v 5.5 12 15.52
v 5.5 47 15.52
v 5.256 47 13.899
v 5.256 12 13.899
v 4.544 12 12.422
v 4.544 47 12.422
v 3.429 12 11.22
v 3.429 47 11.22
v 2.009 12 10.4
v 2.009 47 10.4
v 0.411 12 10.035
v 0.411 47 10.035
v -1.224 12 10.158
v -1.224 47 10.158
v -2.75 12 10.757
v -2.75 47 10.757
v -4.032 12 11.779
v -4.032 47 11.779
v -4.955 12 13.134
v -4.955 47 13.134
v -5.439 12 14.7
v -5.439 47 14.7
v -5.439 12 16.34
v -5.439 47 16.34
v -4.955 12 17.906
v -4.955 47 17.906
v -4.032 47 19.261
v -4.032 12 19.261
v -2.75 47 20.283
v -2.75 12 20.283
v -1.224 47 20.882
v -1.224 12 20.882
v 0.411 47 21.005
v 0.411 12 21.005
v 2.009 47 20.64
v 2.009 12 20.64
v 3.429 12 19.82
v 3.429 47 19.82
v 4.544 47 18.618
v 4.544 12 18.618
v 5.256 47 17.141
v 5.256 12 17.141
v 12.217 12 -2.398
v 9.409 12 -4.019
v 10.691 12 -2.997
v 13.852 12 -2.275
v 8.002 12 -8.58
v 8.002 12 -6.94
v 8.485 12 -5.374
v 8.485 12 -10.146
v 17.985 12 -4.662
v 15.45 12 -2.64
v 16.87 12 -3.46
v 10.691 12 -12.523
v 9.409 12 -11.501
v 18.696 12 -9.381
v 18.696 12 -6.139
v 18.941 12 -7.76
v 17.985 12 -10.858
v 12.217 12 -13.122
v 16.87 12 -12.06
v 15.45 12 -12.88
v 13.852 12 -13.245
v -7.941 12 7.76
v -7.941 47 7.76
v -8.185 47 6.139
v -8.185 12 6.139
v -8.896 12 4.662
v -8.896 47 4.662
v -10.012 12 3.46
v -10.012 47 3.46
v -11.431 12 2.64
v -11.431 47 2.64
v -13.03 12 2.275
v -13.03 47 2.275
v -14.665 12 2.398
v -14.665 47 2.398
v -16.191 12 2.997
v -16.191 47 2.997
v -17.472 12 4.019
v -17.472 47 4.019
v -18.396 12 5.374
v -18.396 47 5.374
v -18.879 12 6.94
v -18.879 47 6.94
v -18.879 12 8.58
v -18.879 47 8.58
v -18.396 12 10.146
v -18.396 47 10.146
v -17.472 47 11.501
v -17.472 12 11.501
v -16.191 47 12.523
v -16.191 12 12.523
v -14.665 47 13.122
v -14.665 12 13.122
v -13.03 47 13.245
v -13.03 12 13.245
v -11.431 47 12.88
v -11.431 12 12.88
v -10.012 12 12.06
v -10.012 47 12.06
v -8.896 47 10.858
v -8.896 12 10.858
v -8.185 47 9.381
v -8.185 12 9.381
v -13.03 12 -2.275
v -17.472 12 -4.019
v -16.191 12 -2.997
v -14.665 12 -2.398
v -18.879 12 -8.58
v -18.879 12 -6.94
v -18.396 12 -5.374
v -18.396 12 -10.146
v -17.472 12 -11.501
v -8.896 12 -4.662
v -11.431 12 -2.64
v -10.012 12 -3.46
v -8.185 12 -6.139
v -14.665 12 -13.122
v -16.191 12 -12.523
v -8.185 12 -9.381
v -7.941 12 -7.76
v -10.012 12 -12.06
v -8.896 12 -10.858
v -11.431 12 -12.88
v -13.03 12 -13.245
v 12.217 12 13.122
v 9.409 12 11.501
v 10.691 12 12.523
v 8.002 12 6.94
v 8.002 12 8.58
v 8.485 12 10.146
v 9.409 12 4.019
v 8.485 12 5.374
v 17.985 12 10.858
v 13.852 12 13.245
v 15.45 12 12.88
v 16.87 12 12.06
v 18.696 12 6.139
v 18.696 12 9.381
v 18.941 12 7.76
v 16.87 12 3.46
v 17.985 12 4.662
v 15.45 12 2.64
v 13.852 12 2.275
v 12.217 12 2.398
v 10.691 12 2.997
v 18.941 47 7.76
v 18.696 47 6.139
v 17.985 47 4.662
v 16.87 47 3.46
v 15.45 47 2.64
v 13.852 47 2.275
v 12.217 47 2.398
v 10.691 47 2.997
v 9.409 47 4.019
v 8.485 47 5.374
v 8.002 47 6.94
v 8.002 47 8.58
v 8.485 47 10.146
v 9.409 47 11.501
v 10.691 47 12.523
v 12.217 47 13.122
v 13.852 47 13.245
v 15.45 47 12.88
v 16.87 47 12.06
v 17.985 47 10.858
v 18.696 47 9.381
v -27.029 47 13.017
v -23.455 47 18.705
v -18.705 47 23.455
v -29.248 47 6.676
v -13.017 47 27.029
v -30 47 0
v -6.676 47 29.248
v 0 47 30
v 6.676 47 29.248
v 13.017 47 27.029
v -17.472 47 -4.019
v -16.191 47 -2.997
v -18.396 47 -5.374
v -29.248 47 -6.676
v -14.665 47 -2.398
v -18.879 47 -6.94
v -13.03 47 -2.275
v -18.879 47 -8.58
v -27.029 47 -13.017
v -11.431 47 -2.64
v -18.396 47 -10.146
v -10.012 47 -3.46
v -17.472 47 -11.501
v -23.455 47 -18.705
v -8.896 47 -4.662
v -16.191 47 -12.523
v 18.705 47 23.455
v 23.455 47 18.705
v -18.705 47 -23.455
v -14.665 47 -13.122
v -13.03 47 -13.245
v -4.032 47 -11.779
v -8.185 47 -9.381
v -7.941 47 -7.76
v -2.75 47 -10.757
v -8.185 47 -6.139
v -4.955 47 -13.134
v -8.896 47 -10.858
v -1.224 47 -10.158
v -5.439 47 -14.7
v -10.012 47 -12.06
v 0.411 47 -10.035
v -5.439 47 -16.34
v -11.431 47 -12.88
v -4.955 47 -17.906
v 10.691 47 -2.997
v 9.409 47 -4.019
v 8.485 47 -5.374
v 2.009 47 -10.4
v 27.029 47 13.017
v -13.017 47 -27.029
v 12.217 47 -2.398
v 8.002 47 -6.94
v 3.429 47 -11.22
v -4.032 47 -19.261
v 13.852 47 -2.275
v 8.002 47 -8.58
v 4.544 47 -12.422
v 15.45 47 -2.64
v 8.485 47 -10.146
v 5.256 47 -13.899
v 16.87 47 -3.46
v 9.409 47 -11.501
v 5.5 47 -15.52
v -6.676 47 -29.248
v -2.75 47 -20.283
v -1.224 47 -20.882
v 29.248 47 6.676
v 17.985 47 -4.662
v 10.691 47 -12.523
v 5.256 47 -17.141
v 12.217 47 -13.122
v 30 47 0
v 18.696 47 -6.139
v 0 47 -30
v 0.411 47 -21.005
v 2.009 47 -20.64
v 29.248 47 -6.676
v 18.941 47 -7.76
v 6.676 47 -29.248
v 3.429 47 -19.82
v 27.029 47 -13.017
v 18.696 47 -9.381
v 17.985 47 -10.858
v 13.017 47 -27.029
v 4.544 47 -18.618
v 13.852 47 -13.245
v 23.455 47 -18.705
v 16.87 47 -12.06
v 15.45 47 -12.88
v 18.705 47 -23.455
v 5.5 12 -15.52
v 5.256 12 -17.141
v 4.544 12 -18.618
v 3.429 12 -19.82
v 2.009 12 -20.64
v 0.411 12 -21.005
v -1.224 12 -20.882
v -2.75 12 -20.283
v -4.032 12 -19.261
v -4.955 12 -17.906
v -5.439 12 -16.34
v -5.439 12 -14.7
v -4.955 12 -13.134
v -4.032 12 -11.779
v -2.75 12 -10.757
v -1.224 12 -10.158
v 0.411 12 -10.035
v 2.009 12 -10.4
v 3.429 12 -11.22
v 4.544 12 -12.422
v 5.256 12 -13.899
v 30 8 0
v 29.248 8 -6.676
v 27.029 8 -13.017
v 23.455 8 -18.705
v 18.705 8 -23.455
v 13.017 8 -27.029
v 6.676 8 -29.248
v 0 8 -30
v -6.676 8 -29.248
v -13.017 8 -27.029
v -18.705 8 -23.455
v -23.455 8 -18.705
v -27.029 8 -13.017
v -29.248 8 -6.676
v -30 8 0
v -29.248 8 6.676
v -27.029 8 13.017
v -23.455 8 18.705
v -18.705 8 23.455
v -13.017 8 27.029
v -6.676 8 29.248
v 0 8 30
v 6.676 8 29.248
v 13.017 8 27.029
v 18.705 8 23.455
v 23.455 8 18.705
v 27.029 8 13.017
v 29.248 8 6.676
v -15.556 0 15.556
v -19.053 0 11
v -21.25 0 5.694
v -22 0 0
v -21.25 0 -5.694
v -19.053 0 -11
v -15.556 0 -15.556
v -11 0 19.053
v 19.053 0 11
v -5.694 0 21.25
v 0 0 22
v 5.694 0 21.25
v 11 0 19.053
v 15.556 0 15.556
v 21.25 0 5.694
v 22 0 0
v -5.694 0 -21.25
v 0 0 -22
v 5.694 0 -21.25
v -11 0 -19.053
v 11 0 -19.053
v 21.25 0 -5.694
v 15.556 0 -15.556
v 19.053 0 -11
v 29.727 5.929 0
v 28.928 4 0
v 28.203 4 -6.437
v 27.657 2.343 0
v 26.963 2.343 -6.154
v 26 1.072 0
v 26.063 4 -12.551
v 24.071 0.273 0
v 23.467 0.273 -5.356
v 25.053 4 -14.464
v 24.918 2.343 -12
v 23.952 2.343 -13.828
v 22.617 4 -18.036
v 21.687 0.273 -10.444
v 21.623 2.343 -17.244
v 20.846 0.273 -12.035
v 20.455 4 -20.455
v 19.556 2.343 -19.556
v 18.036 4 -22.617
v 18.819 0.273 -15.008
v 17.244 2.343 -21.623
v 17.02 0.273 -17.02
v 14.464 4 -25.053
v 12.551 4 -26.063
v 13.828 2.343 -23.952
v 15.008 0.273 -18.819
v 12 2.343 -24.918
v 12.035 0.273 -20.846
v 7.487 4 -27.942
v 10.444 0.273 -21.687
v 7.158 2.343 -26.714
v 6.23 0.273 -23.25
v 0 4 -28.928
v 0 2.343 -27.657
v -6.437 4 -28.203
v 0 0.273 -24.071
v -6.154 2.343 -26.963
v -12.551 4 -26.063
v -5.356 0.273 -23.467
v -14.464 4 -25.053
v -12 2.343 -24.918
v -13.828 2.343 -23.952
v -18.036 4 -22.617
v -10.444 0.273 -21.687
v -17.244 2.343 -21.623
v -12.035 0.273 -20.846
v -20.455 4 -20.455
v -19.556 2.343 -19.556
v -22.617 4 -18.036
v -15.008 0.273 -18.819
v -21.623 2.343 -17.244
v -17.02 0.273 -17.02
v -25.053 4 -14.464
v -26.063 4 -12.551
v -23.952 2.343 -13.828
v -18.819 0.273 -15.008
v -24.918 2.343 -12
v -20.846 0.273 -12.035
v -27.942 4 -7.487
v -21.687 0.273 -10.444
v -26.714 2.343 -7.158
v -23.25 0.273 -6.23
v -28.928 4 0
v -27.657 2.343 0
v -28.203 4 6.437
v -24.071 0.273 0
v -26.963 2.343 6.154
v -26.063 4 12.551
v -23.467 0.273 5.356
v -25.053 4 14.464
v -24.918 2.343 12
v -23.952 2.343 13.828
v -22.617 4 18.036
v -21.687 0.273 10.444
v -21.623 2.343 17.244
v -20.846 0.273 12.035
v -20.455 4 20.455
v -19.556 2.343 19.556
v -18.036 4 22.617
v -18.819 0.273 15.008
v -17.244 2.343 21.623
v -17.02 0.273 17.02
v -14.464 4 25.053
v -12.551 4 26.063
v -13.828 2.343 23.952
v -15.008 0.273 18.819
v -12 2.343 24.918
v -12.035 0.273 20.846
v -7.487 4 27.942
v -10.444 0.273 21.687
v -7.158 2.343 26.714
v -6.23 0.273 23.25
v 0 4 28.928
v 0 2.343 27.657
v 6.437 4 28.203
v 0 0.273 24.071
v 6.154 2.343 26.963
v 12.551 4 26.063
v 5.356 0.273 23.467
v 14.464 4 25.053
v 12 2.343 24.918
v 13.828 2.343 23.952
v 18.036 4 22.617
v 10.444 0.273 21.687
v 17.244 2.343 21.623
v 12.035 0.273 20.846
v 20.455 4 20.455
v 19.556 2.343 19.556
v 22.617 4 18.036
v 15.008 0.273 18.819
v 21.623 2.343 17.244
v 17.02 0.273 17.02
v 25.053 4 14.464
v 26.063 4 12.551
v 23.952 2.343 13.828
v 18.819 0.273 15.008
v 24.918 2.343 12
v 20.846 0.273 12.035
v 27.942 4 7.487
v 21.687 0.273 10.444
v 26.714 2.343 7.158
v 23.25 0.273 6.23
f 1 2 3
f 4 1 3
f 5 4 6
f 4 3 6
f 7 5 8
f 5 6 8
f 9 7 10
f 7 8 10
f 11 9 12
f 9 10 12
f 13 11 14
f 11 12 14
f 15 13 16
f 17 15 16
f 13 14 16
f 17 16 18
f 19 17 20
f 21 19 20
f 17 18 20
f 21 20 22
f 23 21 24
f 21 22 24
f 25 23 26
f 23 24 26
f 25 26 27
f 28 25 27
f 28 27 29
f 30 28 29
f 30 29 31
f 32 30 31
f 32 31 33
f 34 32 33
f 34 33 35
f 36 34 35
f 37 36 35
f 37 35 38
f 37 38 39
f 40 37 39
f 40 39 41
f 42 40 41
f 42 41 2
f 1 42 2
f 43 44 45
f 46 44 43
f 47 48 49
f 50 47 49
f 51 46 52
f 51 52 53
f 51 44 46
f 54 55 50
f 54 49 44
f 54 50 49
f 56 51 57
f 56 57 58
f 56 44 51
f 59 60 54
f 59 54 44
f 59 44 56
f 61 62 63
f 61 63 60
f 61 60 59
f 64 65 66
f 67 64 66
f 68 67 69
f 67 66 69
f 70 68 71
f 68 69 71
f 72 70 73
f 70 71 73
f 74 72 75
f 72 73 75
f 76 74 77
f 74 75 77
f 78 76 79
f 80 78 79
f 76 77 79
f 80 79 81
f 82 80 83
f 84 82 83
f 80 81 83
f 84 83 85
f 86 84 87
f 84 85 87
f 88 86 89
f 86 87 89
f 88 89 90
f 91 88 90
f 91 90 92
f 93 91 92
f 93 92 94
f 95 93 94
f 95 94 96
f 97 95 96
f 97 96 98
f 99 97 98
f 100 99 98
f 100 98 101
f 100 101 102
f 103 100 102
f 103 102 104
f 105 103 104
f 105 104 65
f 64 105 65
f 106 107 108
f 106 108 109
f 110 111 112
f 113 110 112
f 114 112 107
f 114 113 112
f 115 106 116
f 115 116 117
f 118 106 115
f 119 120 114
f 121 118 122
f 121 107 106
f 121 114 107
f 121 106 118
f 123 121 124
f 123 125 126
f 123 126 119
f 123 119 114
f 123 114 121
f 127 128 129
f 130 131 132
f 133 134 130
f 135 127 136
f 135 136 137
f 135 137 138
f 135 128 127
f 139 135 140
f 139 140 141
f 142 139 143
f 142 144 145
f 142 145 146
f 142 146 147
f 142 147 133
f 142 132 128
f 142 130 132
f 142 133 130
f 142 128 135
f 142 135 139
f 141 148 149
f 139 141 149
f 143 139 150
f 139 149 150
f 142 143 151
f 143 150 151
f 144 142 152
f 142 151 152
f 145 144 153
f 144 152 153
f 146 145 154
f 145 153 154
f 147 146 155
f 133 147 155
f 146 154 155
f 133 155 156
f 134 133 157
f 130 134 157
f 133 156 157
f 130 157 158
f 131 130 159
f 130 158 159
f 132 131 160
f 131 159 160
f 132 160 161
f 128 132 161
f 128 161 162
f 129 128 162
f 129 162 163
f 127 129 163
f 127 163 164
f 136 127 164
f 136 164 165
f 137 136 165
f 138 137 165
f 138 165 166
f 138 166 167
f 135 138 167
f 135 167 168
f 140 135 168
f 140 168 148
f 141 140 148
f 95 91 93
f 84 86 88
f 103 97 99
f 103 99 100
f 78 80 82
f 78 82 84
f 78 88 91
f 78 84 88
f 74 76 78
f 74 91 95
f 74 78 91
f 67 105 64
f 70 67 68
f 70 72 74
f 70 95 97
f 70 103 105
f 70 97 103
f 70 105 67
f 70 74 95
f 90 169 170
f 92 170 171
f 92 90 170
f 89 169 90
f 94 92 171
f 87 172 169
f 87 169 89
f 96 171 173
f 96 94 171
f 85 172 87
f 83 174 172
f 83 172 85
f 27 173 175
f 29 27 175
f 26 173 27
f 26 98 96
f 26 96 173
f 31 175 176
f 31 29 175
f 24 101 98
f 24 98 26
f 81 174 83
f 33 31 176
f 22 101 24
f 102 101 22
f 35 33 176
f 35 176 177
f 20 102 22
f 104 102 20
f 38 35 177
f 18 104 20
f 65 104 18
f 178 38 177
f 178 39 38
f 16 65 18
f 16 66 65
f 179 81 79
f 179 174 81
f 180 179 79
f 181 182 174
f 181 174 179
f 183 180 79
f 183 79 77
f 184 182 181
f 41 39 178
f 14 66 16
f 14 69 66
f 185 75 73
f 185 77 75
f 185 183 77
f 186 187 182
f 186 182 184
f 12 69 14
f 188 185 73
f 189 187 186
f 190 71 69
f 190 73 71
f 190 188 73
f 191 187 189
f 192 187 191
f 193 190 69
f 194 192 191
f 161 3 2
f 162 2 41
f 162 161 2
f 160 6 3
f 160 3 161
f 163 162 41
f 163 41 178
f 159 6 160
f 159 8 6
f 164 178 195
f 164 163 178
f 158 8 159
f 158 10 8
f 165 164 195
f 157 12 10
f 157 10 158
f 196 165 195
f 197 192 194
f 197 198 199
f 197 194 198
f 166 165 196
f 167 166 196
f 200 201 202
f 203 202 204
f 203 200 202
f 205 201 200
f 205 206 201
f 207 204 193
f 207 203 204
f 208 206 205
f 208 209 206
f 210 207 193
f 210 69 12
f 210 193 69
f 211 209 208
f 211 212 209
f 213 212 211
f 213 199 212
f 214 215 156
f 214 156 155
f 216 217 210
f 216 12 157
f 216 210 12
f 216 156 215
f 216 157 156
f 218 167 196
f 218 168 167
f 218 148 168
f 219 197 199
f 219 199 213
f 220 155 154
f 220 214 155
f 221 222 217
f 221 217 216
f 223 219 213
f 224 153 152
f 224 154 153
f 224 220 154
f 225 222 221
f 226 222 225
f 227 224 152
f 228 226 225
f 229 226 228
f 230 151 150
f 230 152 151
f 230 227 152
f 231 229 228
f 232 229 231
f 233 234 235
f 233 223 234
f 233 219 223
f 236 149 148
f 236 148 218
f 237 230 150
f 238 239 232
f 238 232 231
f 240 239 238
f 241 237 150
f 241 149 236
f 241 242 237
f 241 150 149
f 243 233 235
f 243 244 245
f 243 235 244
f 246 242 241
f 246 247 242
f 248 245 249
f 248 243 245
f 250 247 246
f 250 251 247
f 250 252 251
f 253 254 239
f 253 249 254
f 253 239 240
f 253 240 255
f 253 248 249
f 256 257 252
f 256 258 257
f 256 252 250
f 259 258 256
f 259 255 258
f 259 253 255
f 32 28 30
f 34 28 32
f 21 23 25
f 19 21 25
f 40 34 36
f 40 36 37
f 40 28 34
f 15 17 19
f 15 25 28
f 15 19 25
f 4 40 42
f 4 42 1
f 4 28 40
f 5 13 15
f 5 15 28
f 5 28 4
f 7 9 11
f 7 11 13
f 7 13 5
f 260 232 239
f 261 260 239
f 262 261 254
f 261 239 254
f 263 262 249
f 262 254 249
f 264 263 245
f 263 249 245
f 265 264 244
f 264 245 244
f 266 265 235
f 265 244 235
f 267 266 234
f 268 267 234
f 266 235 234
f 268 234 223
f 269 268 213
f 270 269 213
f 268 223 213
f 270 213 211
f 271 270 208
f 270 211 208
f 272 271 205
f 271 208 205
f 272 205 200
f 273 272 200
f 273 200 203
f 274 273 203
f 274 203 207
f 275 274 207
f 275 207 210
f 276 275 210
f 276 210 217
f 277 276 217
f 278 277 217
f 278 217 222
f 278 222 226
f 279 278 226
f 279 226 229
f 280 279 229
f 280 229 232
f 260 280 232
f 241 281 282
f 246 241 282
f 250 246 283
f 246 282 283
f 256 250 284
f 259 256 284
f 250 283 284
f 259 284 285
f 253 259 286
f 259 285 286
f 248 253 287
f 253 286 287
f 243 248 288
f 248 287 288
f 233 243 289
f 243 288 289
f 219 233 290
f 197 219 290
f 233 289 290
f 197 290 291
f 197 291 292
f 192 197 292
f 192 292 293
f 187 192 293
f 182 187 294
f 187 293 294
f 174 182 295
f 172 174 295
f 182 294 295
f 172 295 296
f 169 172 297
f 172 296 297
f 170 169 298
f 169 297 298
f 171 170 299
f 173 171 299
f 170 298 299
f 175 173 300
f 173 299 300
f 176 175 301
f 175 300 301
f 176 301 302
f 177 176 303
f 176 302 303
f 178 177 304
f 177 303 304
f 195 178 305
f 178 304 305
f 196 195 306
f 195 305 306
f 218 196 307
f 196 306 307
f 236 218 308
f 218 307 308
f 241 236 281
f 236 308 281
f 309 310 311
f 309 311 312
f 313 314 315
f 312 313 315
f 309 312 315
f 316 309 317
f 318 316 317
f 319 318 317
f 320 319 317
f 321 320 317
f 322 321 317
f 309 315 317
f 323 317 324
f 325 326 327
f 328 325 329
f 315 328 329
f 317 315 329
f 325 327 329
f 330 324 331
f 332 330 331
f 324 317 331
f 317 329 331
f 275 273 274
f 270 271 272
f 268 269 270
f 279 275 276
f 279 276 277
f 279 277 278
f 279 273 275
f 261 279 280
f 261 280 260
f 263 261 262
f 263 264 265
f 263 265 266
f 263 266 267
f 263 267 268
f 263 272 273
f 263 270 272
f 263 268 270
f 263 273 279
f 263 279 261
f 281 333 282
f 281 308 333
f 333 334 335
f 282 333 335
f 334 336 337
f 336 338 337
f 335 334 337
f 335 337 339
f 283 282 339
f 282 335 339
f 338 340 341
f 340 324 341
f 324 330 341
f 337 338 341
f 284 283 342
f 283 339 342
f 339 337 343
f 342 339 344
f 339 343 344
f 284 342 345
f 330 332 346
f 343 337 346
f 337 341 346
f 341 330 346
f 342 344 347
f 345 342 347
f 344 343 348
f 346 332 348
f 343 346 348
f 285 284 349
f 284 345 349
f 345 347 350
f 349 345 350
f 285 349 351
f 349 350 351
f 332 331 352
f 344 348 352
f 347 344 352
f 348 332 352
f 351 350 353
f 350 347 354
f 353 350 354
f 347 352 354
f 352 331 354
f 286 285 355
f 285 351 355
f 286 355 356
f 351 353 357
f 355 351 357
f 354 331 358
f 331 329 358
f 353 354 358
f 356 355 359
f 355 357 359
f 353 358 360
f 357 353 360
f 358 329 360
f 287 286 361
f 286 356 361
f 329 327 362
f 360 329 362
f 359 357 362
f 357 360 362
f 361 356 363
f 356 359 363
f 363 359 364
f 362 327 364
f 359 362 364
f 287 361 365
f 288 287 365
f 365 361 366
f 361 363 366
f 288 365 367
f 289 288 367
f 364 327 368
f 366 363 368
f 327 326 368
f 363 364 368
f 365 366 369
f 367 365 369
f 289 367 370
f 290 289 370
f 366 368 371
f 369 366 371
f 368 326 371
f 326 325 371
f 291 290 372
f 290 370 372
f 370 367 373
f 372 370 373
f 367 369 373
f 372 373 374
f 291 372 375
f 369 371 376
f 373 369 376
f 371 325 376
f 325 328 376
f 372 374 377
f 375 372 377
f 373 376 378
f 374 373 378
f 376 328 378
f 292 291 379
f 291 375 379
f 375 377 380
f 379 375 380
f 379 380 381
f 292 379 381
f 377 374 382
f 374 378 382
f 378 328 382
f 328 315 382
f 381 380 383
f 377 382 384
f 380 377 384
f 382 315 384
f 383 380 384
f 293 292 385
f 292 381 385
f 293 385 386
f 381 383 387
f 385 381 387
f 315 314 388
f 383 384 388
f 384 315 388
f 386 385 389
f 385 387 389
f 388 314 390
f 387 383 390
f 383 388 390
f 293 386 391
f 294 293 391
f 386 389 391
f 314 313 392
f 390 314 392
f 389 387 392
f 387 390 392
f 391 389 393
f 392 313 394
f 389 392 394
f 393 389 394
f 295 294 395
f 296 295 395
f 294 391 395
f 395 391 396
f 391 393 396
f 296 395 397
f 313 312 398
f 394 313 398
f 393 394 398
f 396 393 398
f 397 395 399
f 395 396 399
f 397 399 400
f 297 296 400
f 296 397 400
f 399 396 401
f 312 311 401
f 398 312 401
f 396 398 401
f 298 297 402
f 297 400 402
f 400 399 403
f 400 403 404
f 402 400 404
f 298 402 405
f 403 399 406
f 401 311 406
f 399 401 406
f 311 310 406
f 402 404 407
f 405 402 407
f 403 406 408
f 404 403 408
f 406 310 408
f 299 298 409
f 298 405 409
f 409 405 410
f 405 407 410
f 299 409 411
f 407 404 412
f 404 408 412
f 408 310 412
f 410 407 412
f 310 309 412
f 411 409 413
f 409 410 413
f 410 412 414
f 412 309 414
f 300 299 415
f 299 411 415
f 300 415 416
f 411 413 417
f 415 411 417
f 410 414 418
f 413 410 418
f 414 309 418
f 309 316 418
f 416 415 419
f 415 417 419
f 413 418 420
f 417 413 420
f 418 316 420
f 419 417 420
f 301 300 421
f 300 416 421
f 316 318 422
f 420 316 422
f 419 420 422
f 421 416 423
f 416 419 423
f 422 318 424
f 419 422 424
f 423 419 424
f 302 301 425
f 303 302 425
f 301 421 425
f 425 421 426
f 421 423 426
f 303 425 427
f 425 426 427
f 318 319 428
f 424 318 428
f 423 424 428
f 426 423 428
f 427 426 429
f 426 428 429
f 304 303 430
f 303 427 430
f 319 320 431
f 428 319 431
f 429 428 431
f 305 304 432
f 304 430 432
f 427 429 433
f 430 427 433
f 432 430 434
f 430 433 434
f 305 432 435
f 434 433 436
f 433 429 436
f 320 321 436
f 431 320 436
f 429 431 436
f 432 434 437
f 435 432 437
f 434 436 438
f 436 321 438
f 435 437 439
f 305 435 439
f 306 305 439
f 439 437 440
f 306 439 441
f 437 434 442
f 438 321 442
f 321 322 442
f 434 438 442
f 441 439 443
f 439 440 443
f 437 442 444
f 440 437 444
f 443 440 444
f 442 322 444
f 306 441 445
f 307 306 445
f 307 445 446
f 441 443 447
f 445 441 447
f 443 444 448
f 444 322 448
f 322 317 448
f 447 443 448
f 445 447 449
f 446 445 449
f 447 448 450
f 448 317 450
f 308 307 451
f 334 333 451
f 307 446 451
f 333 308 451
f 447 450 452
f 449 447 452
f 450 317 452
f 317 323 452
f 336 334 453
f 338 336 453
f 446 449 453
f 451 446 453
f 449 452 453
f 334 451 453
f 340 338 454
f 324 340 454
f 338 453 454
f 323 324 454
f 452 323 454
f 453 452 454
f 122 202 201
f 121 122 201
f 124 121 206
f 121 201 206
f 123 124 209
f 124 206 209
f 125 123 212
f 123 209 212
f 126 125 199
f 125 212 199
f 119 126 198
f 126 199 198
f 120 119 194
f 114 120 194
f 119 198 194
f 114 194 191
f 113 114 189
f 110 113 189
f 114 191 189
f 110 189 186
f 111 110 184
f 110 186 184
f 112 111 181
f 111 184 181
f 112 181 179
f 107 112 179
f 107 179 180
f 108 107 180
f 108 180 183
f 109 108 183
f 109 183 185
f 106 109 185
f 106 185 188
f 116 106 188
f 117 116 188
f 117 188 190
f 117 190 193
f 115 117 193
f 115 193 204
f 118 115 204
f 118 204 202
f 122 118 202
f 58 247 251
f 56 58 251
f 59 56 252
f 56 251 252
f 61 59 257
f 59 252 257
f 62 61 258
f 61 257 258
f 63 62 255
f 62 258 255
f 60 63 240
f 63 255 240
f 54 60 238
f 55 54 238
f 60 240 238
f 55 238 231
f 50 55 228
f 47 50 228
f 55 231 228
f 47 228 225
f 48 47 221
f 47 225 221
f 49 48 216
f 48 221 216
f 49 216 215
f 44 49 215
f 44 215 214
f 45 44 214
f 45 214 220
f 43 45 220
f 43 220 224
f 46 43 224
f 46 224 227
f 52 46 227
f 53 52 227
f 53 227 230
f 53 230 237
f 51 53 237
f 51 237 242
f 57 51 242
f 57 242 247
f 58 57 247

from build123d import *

# Parameters (mm, degrees)
SKETCH1_R           = 30
BOSS_EXTRUDE1_DEPTH = 47
SKETCH2_R           = 5.5
CUT_EXTRUDE1_DEPTH  = 32
FILLET1_R           = 8
SKETCH2_3_R         = 5.5
CUT_EXTRUDE2_DEPTH  = 35


with BuildPart() as part:
    # Sketch1 → Boss-Extrude1 (new body)
    with BuildSketch(Plane(origin=(0, 0, 0), x_dir=(1, 0, 0), z_dir=(0, 1, 0))):
        Circle(SKETCH1_R)
    extrude(amount=BOSS_EXTRUDE1_DEPTH)

    # Sketch2 → Cut-Extrude1 (cut)
    with BuildSketch(Plane(origin=(0, 47, 0), x_dir=(1, 0, 0), z_dir=(0, 1, 0))):
        with Locations((0, 15.52)):
            Circle(SKETCH2_R)
        with Locations((-13.440714267, 7.76)):
            Circle(SKETCH2_R)
        with Locations((-13.440714267, -7.76)):
            Circle(SKETCH2_R)
        with Locations((0, -15.52)):
            Circle(SKETCH2_R)
        with Locations((13.440714267, -7.76)):
            Circle(SKETCH2_R)
        with Locations((13.440714267, 7.76)):
            Circle(SKETCH2_R)
    extrude(amount=-CUT_EXTRUDE1_DEPTH, mode=Mode.SUBTRACT)

    # Fillet1
    fillet1_edges = [part.edges().sort_by_distance(p)[0] for p in [
        (-30, 0, 0),
    ]]
    fillet(fillet1_edges, radius=FILLET1_R)

    # Sketch2<3> → Cut-Extrude2 (cut)
    with BuildSketch(Plane(origin=(0, 47, 0), x_dir=(1, 0, 0), z_dir=(0, 1, 0))):
        with Locations((0, 15.52)):
            Circle(SKETCH2_3_R)
        with Locations((-13.440714267, 7.76)):
            Circle(SKETCH2_3_R)
        with Locations((-13.440714267, -7.76)):
            Circle(SKETCH2_3_R)
        with Locations((0, -15.52)):
            Circle(SKETCH2_3_R)
        with Locations((13.440714267, -7.76)):
            Circle(SKETCH2_3_R)
        with Locations((13.440714267, 7.76)):
            Circle(SKETCH2_3_R)
    extrude(amount=-CUT_EXTRUDE2_DEPTH, mode=Mode.SUBTRACT)


solid = part.part
